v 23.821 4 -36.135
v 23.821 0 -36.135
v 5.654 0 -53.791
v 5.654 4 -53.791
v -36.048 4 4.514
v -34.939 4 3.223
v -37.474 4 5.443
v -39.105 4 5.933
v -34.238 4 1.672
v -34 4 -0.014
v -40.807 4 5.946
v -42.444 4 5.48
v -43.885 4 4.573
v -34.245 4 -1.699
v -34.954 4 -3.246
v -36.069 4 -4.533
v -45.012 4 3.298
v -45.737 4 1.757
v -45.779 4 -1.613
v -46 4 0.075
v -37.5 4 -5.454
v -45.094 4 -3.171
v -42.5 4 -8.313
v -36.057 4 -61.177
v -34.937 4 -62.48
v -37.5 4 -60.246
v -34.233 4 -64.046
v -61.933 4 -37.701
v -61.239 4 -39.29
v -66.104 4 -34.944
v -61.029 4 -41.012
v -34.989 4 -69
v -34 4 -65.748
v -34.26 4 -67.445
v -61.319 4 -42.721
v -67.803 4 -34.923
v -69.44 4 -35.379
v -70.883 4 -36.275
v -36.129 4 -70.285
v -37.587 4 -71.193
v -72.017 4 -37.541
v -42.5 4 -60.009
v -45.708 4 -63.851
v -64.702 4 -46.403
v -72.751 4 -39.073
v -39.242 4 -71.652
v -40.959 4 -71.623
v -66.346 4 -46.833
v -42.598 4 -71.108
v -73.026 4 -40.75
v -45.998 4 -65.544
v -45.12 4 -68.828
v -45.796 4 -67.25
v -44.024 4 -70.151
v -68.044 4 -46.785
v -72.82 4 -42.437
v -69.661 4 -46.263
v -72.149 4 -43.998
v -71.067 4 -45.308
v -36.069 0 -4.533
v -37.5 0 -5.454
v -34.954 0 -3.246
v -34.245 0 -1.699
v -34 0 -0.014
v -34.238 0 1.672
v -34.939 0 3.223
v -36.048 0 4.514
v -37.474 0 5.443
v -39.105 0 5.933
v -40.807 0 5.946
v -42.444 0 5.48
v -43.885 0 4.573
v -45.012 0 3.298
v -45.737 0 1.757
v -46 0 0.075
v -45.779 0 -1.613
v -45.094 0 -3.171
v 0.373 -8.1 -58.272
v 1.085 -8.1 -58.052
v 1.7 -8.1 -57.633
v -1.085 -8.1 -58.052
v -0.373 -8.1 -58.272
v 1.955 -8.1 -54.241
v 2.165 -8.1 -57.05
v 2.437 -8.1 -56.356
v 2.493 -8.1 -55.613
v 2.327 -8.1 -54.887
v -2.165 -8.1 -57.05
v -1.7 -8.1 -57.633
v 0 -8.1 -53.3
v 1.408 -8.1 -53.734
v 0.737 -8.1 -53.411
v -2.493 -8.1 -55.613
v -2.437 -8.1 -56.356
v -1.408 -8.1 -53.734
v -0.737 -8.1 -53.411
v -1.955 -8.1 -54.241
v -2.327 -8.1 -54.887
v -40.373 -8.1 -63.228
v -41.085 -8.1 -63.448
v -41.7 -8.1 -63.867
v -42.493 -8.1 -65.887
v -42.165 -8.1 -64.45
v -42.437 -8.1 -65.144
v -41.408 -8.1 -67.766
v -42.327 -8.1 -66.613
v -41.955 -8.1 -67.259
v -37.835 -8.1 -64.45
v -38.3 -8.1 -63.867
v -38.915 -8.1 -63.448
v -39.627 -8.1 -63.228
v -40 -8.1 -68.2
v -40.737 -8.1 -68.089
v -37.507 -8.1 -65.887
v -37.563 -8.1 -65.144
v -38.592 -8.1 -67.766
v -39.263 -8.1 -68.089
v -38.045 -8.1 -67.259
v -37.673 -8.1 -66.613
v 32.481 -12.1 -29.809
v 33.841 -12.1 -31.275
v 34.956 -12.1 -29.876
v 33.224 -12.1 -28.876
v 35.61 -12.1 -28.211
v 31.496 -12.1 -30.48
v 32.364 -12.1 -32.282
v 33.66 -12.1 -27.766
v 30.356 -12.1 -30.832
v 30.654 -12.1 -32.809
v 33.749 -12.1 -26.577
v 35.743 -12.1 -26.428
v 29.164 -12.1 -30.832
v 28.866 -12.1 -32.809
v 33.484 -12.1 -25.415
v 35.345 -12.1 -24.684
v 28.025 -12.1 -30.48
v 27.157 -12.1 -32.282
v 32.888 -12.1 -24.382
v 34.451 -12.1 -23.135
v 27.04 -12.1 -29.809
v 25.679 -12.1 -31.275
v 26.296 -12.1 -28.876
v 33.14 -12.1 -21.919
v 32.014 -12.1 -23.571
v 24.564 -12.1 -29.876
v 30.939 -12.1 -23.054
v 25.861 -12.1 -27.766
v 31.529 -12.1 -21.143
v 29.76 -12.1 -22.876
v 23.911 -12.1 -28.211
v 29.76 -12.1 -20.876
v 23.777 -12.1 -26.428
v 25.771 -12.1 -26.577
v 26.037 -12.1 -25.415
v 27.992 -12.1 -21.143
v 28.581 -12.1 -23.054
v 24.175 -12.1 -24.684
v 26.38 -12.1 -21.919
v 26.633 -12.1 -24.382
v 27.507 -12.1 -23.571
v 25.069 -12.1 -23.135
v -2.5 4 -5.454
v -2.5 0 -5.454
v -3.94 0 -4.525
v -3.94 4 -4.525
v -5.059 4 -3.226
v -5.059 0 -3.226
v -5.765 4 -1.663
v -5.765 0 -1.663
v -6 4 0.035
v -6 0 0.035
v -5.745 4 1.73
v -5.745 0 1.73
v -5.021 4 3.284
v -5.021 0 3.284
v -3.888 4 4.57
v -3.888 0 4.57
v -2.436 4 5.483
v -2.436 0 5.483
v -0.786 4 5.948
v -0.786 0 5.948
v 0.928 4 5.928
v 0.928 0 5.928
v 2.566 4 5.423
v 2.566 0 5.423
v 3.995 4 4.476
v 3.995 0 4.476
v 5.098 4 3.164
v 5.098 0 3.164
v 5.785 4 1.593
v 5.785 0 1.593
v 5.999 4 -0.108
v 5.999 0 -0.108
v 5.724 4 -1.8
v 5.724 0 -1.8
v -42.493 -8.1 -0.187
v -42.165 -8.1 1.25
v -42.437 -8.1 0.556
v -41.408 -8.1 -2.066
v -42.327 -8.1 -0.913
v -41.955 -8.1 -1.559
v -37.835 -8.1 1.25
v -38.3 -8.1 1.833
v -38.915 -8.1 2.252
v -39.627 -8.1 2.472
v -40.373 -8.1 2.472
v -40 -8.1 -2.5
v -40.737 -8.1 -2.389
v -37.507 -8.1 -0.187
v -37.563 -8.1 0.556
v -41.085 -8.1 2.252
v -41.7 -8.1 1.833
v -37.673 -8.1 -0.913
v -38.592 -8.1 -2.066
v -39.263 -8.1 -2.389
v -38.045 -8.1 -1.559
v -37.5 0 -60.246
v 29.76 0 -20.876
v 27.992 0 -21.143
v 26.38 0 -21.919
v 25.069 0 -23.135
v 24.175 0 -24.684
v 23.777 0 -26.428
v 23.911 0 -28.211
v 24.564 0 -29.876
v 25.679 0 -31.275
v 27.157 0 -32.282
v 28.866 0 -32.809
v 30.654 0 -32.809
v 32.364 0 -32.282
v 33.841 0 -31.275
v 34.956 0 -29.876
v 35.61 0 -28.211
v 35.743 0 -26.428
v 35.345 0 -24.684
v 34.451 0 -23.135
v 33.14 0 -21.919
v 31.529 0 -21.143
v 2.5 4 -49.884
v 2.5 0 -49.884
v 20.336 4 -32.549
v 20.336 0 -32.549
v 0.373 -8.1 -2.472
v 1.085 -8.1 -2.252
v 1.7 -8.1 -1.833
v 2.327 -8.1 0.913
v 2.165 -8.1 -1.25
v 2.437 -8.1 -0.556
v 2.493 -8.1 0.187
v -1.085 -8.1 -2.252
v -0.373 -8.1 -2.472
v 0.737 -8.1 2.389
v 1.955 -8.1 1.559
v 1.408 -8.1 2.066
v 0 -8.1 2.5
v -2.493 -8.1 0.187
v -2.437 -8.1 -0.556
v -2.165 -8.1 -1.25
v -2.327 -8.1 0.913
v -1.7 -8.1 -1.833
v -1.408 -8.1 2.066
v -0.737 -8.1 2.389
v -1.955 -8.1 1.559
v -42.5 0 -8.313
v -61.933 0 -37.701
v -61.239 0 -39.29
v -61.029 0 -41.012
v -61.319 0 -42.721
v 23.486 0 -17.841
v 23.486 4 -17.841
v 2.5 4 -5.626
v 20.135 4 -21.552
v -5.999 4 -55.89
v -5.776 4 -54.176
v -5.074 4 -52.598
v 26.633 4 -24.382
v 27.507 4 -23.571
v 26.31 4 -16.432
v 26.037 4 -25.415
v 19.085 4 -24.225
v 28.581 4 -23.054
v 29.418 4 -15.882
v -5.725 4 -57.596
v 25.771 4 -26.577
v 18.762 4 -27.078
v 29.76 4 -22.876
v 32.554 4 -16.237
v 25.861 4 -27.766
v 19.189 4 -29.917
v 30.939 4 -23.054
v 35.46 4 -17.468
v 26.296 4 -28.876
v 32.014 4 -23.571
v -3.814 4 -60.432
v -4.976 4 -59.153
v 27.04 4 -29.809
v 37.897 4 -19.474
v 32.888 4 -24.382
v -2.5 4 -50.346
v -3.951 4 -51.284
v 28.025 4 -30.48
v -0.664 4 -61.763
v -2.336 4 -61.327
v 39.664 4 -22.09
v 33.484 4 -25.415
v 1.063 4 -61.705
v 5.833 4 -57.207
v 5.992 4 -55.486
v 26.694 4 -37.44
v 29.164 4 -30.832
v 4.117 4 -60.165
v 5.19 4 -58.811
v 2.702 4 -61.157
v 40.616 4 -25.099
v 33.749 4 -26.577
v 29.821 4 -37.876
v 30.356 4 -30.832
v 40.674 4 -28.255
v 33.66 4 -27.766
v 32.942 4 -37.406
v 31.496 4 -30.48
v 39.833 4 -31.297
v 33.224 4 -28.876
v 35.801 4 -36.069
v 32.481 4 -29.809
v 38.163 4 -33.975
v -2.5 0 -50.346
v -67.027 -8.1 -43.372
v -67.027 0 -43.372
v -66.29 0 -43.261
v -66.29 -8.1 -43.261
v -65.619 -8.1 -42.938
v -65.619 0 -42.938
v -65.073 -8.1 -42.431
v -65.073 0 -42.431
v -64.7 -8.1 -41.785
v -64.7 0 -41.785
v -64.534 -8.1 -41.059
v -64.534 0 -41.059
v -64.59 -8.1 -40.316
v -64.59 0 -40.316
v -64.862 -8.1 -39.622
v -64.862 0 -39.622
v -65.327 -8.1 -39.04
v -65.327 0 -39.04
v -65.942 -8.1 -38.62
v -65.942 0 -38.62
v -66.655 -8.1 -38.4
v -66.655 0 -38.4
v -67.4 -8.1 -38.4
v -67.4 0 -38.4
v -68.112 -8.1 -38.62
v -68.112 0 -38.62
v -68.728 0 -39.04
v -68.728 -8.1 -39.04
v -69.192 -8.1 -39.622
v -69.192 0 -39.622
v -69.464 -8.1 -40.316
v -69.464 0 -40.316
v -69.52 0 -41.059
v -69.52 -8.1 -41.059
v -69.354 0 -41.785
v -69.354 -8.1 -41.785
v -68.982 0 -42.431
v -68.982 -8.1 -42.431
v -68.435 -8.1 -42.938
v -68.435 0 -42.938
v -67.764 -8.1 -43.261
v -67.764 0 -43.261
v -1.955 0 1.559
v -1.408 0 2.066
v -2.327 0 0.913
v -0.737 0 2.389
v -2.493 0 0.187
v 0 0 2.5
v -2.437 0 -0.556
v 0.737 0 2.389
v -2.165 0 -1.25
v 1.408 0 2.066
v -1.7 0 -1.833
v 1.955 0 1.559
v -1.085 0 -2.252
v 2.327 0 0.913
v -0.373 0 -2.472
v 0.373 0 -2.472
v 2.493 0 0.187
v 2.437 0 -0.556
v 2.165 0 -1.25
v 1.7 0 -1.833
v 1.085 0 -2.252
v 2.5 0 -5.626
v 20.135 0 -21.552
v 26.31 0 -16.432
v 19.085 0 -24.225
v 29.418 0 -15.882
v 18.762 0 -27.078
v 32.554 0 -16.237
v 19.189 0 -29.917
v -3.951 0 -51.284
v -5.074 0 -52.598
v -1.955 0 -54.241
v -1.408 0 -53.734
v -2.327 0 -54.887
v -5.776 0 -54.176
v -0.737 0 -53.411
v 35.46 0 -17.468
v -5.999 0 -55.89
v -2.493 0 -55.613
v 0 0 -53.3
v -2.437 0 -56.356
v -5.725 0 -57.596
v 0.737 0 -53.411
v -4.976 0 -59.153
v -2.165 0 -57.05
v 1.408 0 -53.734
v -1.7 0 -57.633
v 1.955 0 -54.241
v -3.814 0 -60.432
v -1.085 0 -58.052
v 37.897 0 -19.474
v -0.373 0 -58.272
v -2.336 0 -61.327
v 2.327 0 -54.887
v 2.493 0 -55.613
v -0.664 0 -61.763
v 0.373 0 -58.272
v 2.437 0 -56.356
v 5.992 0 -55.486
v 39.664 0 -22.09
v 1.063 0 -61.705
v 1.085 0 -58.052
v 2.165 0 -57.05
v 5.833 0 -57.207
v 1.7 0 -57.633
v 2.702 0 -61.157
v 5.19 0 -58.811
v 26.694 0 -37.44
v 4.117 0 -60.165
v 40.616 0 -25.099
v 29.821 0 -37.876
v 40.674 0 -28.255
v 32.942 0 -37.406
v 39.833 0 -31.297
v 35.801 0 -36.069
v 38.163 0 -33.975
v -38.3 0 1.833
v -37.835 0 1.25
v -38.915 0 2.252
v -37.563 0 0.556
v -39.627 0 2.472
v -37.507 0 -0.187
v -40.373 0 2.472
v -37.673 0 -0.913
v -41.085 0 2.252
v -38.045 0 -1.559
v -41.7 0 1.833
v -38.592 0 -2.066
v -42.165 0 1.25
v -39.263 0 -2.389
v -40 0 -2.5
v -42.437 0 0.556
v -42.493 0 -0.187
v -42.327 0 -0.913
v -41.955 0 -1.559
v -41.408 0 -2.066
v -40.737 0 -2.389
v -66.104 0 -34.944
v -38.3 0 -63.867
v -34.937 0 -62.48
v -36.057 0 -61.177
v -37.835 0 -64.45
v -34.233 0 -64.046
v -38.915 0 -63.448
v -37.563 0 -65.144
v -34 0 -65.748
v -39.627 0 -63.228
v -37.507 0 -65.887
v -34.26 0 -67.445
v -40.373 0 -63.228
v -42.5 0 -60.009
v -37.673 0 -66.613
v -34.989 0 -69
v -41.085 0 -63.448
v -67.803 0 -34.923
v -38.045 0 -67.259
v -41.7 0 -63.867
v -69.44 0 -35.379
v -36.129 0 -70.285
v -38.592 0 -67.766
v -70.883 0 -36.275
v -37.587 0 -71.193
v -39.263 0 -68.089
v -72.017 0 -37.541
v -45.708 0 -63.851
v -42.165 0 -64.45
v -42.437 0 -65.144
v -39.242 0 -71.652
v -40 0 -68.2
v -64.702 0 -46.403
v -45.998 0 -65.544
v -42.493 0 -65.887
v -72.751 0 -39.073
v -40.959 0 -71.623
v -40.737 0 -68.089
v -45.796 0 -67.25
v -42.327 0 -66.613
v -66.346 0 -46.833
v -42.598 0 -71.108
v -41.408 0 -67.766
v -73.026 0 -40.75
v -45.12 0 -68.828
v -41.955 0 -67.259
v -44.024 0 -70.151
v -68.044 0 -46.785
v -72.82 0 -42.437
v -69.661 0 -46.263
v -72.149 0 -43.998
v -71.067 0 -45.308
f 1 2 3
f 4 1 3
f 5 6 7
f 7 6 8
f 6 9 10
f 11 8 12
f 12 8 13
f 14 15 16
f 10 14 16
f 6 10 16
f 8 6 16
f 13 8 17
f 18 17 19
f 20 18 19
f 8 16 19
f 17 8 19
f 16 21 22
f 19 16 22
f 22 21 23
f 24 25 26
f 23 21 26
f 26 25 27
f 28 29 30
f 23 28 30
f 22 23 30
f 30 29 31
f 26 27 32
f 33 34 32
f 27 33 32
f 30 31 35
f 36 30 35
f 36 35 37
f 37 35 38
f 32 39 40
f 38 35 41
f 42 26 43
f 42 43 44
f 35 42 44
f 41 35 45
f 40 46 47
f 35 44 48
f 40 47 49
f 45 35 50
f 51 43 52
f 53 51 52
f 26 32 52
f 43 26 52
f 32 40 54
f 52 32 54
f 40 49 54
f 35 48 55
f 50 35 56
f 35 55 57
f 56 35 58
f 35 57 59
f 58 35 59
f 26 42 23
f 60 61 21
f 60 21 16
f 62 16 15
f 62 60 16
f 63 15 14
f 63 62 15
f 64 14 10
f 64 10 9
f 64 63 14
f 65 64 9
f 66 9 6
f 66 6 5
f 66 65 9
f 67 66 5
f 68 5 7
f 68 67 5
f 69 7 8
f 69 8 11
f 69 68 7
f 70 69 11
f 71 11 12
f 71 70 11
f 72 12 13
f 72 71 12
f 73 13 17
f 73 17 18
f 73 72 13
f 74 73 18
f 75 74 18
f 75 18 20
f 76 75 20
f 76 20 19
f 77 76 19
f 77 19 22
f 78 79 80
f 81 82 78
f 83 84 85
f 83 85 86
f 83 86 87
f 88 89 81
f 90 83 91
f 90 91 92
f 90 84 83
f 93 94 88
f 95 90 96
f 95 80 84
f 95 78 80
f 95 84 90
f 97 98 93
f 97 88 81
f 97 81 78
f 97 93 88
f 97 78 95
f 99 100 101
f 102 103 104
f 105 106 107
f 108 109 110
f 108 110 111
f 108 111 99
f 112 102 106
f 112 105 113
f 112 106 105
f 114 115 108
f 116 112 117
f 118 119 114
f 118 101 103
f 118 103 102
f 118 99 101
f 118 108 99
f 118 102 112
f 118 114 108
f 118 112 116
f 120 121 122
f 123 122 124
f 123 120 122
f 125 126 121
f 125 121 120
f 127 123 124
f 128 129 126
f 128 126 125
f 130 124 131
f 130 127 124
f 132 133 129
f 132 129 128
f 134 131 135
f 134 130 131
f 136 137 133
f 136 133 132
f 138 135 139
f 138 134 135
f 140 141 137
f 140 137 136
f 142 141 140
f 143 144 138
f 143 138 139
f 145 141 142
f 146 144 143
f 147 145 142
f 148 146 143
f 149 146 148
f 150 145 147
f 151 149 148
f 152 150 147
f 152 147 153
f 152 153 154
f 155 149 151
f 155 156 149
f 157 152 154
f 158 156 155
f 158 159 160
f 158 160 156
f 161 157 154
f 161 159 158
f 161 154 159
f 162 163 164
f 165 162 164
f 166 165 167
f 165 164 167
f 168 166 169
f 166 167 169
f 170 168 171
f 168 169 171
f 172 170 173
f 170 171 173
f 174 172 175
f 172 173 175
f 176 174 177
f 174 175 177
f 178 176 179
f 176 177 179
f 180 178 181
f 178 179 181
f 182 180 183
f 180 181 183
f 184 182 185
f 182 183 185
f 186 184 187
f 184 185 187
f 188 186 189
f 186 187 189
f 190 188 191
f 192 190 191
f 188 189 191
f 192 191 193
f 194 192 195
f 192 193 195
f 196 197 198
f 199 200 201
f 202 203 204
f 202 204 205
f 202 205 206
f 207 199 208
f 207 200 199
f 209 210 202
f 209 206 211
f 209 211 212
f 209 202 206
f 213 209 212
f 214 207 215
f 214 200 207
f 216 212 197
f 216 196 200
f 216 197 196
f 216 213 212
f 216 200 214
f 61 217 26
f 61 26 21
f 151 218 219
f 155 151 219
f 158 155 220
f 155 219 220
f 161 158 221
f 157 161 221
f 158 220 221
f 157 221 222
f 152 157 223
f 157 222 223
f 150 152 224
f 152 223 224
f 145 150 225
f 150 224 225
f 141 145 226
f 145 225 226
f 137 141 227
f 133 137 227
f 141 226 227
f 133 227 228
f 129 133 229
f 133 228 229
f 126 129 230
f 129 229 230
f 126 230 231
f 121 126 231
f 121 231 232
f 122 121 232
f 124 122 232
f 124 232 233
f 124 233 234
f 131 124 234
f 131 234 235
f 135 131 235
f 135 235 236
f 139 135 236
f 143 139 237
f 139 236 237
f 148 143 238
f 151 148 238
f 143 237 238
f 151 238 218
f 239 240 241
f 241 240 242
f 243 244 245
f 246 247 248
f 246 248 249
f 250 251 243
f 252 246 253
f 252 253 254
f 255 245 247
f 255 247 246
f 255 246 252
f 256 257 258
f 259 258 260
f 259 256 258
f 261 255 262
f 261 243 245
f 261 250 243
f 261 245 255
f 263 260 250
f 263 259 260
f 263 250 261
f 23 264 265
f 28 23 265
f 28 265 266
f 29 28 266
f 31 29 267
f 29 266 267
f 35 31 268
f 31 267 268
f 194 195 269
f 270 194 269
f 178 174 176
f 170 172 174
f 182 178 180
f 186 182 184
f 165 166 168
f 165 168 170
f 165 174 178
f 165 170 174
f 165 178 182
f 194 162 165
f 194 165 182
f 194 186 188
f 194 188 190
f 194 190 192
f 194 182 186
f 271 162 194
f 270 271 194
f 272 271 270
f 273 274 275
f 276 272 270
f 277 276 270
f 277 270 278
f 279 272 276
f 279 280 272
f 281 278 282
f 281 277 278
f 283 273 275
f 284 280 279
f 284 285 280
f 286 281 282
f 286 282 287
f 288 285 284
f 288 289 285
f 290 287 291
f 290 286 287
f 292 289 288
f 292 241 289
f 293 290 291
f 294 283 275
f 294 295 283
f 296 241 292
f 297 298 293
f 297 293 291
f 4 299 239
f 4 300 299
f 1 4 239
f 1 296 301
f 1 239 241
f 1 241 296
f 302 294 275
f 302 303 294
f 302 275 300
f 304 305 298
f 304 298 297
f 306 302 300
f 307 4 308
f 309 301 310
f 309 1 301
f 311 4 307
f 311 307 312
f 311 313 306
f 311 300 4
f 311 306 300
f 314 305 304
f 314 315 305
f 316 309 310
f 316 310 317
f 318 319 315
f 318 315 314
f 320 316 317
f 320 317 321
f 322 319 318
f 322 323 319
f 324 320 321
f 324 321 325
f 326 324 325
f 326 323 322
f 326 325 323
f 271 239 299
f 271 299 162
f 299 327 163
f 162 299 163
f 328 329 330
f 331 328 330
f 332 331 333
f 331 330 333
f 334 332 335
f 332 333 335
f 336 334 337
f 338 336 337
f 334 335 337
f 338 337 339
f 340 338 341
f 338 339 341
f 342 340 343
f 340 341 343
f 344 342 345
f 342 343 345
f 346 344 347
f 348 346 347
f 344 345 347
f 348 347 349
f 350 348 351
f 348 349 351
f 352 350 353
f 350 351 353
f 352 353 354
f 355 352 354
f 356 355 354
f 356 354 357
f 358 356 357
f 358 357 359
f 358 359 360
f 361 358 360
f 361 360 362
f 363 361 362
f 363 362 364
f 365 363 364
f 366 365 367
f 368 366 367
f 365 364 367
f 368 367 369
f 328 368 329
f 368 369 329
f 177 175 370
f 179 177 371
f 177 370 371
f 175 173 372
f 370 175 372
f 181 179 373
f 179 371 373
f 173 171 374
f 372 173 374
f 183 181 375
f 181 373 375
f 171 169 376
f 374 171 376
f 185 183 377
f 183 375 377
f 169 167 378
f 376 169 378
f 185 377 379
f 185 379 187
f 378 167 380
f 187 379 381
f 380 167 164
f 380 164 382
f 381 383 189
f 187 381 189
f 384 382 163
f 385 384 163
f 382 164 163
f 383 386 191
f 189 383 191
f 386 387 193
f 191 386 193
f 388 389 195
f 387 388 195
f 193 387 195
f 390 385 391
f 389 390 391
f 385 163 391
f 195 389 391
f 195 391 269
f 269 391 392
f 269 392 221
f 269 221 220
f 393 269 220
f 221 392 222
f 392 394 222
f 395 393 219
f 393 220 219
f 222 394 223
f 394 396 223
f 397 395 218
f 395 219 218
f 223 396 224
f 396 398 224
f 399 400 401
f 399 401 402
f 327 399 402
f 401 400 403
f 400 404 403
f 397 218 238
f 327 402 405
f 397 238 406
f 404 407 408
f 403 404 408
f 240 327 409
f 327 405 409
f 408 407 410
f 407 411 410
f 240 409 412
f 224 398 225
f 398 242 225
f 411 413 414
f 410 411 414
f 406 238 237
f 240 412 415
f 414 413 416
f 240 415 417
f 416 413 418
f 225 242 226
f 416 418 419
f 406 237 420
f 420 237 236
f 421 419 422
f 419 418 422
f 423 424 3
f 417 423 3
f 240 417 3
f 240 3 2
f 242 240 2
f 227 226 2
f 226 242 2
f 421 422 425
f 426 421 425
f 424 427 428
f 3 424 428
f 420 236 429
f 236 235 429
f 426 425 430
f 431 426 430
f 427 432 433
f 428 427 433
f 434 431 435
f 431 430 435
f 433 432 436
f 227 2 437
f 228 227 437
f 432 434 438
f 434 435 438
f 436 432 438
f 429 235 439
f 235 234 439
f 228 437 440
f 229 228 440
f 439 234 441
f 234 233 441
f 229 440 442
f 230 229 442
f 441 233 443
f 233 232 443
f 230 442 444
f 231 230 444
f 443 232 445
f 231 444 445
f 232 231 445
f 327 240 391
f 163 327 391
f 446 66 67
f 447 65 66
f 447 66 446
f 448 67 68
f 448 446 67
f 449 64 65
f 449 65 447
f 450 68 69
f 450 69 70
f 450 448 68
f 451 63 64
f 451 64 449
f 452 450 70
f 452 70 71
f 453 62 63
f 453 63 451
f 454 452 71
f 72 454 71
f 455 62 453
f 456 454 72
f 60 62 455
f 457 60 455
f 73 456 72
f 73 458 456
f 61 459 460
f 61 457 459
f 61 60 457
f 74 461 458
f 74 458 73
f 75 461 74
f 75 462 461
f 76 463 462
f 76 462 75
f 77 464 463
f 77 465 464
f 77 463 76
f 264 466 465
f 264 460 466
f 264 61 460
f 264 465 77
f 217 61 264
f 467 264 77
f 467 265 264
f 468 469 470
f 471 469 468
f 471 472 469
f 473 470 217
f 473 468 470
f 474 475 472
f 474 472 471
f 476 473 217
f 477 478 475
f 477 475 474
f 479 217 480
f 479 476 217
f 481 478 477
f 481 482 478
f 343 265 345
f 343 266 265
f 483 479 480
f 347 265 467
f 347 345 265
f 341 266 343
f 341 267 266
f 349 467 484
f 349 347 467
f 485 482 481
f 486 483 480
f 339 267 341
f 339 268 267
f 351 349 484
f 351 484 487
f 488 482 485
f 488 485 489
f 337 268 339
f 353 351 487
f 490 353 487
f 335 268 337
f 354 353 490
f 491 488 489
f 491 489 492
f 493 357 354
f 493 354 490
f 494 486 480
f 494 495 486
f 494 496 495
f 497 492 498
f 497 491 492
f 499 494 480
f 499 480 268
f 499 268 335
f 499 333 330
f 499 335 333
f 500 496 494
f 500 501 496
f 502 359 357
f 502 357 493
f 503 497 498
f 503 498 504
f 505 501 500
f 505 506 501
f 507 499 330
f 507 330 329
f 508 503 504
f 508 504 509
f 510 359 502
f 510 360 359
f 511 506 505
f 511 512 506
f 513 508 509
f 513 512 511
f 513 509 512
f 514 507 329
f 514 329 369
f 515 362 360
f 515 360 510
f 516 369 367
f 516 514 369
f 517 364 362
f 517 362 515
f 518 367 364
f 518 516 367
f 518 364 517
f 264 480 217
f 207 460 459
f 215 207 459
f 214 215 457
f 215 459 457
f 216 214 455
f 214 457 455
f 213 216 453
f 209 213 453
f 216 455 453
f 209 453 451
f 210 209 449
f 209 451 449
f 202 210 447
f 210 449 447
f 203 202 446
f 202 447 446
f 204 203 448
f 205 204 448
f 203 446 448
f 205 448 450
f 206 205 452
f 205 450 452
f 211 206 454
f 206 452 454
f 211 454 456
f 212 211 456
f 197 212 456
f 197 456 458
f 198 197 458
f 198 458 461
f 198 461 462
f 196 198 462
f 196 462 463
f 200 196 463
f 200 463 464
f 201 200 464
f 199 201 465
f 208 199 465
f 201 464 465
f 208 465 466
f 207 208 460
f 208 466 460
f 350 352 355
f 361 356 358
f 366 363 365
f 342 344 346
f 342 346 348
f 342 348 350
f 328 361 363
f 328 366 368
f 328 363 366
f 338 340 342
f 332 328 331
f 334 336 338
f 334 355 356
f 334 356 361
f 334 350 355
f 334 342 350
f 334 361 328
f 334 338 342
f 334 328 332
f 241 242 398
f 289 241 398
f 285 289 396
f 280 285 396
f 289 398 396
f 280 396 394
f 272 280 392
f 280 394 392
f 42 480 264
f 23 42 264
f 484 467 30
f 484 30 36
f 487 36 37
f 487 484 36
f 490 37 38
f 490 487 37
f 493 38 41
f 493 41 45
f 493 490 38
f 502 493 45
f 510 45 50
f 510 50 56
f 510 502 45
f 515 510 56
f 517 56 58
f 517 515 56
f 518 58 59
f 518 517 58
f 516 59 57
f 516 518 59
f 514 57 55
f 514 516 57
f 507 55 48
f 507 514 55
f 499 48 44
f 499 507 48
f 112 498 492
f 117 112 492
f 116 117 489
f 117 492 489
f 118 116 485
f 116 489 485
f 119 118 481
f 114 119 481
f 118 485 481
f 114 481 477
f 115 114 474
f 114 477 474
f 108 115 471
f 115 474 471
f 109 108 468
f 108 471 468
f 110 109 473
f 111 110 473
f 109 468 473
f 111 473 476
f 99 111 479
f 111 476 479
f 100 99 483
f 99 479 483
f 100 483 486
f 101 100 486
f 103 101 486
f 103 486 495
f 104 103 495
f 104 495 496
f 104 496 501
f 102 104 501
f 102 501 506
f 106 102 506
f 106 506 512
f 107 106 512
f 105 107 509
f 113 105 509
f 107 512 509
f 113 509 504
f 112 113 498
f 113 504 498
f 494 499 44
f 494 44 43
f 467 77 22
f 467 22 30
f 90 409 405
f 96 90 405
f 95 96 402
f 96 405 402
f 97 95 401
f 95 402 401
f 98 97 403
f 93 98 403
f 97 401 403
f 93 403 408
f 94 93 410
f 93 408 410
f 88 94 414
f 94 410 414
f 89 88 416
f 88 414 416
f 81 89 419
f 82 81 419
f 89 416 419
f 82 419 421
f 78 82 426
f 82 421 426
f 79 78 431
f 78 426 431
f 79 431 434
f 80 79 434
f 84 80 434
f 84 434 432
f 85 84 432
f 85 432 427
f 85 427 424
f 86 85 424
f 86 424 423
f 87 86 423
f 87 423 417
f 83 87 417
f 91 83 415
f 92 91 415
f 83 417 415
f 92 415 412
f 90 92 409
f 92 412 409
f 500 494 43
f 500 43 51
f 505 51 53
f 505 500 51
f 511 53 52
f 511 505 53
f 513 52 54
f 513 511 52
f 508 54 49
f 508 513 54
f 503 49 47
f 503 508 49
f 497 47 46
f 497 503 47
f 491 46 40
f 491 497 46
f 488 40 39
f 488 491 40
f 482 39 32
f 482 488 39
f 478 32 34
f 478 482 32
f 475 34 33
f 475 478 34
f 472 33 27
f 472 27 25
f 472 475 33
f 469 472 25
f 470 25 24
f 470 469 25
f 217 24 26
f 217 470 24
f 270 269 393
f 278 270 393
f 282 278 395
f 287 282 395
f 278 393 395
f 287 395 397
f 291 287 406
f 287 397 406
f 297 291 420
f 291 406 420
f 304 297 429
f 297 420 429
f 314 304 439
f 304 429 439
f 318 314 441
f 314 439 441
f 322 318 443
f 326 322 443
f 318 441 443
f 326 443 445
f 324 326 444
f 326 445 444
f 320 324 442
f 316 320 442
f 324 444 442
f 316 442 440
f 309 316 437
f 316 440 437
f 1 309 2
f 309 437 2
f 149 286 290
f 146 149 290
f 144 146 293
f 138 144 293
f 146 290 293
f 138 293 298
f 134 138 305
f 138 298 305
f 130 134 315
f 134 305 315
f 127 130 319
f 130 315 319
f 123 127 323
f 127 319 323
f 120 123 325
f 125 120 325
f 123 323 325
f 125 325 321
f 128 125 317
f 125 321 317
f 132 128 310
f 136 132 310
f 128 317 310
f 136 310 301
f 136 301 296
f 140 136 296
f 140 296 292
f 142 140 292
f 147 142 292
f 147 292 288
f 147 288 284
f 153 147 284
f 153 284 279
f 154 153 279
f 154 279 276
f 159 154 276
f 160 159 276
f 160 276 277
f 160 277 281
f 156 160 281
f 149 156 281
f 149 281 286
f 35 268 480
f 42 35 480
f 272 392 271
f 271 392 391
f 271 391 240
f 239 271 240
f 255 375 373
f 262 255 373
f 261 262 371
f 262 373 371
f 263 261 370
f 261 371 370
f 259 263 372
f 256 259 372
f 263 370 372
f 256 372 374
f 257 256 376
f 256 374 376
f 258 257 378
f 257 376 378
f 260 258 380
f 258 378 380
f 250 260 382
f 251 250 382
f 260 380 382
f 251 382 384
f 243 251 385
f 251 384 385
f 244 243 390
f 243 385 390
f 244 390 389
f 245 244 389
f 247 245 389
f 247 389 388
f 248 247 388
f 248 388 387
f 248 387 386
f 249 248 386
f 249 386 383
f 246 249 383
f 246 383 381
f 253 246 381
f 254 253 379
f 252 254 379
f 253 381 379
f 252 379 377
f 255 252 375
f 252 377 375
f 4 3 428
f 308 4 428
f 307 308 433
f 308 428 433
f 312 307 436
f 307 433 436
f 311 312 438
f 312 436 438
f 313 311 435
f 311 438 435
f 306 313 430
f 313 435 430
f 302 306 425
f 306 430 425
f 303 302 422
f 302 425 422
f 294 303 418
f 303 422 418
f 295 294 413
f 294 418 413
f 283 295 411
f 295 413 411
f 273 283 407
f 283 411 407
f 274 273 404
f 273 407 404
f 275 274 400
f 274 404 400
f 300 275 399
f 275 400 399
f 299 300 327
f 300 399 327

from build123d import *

# Parameters (mm, degrees)
EXTRUDE_1_DEPTH     = 4
EXTRUDE_1_2_DEPTH   = 4
SKETCH_2_R          = 2.5
EXTRUDE_2_DEPTH     = 8.1
SKETCH_3_R          = 2.5
EXTRUDE_3_DEPTH     = 8.1
SKETCH_4_R          = 6
EXTRUDE_4_DEPTH     = 12.1
SKETCH_5_R          = 4
CUT_EXTRUDE_1_DEPTH = 104.600515887


with BuildPart() as part:
    # Эскиз1 → Бобышка-Вытянуть1 (new body)
    with BuildSketch(Plane(origin=(0, 0, 0), x_dir=(1, 0, 0), z_dir=(0, 1, 0))):
        with BuildLine():
            Line((-64.701657296, 46.403150718), (-45.708049543, 63.851170528))
            ThreePointArc((-45.708049543, 63.851170528), (-37.586941576, 71.193373193), (-37.5, 60.245643943))
            Line((-37.5, 60.245643943), (-37.5, 5.454356057))
            ThreePointArc((-37.5, 5.454356057), (-38.272069955, -5.745803491), (-45.093798955, 3.170680085))
            Line((-45.093798955, 3.170680085), (-66.103993638, 34.943592009))
            ThreePointArc((-66.103993638, 34.943592009), (-72.98273861, 41.600945273), (-64.701657296, 46.403150718))
        make_face()
        with BuildLine():
            Line((-61.319115896, 42.72097559), (-42.5, 60.008702662))
            Line((-42.5, 60.008702662), (-42.5, 8.313130943))
            Line((-42.5, 8.313130943), (-61.933366483, 37.701466034))
            ThreePointArc((-61.933366483, 37.701466034), (-61.071592268, 40.143346965), (-61.319115896, 42.72097559))
        make_face(mode=Mode.SUBTRACT)
    extrude(amount=EXTRUDE_1_DEPTH)

    # Эскиз2 → Бобышка-Вытянуть2 (add)
    with BuildSketch(Plane.XZ):
        with Locations(Location((-40, 0, 0), (0, 0, 270))):
            Circle(SKETCH_2_R)
        with Locations(Location((-40, -65.7, 0), (0, 0, 270))):
            Circle(SKETCH_2_R)
        with Locations(Location((-67.027165439, -40.872146119, 0), (0, 0, 270))):
            Circle(SKETCH_2_R)
    extrude(amount=EXTRUDE_2_DEPTH)


with BuildPart() as body_2:
    # Эскиз1 → Extrude 1 2 (new body)
    with BuildSketch(Plane(origin=(0, 0, 0), x_dir=(1, 0, 0), z_dir=(0, 1, 0))):
        with BuildLine():
            Line((-2.5, 50.345643943), (-2.5, 5.454356057))
            ThreePointArc((-2.5, 5.454356057), (-2.436350888, -5.483082559), (5.723536854, 1.800312716))
            Line((5.723536854, 1.800312716), (23.485802209, 17.841335562))
            ThreePointArc((23.485802209, 17.841335562), (40.75840018, 26.67494221), (23.820802166, 36.135017294))
            Line((23.820802166, 36.135017294), (5.653785721, 53.791341986))
            ThreePointArc((5.653785721, 53.791341986), (-2.335551293, 61.326771223), (-2.5, 50.345643943))
        make_face()
        with BuildLine():
            Line((20.134637111, 21.55208919), (2.5, 5.626326843))
            Line((2.5, 5.626326843), (2.5, 49.884082804))
            Line((2.5, 49.884082804), (20.336024345, 32.549445717))
            ThreePointArc((20.336024345, 32.549445717), (18.762088009, 27.077745962), (20.134637111, 21.55208919))
        make_face(mode=Mode.SUBTRACT)
    extrude(amount=EXTRUDE_1_2_DEPTH)

    # Эскиз3 → Бобышка-Вытянуть3 (add)
    with BuildSketch(Plane.XZ):
        with Locations(Location((0, 0, 0), (0, 0, 90))):
            Circle(SKETCH_3_R)
        with Locations(Location((0, -55.8, 0), (0, 0, 90))):
            Circle(SKETCH_3_R)
    extrude(amount=EXTRUDE_3_DEPTH)

    # Эскиз4 → Бобышка-Вытянуть4 (add)
    with BuildSketch(Plane.XZ):
        with Locations(Location((29.760244095, -26.876344086, 0), (0, 0, 90))):
            Circle(SKETCH_4_R)
    extrude(amount=EXTRUDE_4_DEPTH)

    # Эскиз5 → Вырез-Вытянуть1 (cut, through all)
    with BuildSketch(Plane(origin=(0, 4, 0), x_dir=(1, 0, 0), z_dir=(0, 1, 0))):
        with Locations(Location((29.760244095, 26.876344086, 0), (0, 0, 270))):
            Circle(SKETCH_5_R)
    extrude(amount=-CUT_EXTRUDE_1_DEPTH, mode=Mode.SUBTRACT)


solid = Compound([part.part, body_2.part])
